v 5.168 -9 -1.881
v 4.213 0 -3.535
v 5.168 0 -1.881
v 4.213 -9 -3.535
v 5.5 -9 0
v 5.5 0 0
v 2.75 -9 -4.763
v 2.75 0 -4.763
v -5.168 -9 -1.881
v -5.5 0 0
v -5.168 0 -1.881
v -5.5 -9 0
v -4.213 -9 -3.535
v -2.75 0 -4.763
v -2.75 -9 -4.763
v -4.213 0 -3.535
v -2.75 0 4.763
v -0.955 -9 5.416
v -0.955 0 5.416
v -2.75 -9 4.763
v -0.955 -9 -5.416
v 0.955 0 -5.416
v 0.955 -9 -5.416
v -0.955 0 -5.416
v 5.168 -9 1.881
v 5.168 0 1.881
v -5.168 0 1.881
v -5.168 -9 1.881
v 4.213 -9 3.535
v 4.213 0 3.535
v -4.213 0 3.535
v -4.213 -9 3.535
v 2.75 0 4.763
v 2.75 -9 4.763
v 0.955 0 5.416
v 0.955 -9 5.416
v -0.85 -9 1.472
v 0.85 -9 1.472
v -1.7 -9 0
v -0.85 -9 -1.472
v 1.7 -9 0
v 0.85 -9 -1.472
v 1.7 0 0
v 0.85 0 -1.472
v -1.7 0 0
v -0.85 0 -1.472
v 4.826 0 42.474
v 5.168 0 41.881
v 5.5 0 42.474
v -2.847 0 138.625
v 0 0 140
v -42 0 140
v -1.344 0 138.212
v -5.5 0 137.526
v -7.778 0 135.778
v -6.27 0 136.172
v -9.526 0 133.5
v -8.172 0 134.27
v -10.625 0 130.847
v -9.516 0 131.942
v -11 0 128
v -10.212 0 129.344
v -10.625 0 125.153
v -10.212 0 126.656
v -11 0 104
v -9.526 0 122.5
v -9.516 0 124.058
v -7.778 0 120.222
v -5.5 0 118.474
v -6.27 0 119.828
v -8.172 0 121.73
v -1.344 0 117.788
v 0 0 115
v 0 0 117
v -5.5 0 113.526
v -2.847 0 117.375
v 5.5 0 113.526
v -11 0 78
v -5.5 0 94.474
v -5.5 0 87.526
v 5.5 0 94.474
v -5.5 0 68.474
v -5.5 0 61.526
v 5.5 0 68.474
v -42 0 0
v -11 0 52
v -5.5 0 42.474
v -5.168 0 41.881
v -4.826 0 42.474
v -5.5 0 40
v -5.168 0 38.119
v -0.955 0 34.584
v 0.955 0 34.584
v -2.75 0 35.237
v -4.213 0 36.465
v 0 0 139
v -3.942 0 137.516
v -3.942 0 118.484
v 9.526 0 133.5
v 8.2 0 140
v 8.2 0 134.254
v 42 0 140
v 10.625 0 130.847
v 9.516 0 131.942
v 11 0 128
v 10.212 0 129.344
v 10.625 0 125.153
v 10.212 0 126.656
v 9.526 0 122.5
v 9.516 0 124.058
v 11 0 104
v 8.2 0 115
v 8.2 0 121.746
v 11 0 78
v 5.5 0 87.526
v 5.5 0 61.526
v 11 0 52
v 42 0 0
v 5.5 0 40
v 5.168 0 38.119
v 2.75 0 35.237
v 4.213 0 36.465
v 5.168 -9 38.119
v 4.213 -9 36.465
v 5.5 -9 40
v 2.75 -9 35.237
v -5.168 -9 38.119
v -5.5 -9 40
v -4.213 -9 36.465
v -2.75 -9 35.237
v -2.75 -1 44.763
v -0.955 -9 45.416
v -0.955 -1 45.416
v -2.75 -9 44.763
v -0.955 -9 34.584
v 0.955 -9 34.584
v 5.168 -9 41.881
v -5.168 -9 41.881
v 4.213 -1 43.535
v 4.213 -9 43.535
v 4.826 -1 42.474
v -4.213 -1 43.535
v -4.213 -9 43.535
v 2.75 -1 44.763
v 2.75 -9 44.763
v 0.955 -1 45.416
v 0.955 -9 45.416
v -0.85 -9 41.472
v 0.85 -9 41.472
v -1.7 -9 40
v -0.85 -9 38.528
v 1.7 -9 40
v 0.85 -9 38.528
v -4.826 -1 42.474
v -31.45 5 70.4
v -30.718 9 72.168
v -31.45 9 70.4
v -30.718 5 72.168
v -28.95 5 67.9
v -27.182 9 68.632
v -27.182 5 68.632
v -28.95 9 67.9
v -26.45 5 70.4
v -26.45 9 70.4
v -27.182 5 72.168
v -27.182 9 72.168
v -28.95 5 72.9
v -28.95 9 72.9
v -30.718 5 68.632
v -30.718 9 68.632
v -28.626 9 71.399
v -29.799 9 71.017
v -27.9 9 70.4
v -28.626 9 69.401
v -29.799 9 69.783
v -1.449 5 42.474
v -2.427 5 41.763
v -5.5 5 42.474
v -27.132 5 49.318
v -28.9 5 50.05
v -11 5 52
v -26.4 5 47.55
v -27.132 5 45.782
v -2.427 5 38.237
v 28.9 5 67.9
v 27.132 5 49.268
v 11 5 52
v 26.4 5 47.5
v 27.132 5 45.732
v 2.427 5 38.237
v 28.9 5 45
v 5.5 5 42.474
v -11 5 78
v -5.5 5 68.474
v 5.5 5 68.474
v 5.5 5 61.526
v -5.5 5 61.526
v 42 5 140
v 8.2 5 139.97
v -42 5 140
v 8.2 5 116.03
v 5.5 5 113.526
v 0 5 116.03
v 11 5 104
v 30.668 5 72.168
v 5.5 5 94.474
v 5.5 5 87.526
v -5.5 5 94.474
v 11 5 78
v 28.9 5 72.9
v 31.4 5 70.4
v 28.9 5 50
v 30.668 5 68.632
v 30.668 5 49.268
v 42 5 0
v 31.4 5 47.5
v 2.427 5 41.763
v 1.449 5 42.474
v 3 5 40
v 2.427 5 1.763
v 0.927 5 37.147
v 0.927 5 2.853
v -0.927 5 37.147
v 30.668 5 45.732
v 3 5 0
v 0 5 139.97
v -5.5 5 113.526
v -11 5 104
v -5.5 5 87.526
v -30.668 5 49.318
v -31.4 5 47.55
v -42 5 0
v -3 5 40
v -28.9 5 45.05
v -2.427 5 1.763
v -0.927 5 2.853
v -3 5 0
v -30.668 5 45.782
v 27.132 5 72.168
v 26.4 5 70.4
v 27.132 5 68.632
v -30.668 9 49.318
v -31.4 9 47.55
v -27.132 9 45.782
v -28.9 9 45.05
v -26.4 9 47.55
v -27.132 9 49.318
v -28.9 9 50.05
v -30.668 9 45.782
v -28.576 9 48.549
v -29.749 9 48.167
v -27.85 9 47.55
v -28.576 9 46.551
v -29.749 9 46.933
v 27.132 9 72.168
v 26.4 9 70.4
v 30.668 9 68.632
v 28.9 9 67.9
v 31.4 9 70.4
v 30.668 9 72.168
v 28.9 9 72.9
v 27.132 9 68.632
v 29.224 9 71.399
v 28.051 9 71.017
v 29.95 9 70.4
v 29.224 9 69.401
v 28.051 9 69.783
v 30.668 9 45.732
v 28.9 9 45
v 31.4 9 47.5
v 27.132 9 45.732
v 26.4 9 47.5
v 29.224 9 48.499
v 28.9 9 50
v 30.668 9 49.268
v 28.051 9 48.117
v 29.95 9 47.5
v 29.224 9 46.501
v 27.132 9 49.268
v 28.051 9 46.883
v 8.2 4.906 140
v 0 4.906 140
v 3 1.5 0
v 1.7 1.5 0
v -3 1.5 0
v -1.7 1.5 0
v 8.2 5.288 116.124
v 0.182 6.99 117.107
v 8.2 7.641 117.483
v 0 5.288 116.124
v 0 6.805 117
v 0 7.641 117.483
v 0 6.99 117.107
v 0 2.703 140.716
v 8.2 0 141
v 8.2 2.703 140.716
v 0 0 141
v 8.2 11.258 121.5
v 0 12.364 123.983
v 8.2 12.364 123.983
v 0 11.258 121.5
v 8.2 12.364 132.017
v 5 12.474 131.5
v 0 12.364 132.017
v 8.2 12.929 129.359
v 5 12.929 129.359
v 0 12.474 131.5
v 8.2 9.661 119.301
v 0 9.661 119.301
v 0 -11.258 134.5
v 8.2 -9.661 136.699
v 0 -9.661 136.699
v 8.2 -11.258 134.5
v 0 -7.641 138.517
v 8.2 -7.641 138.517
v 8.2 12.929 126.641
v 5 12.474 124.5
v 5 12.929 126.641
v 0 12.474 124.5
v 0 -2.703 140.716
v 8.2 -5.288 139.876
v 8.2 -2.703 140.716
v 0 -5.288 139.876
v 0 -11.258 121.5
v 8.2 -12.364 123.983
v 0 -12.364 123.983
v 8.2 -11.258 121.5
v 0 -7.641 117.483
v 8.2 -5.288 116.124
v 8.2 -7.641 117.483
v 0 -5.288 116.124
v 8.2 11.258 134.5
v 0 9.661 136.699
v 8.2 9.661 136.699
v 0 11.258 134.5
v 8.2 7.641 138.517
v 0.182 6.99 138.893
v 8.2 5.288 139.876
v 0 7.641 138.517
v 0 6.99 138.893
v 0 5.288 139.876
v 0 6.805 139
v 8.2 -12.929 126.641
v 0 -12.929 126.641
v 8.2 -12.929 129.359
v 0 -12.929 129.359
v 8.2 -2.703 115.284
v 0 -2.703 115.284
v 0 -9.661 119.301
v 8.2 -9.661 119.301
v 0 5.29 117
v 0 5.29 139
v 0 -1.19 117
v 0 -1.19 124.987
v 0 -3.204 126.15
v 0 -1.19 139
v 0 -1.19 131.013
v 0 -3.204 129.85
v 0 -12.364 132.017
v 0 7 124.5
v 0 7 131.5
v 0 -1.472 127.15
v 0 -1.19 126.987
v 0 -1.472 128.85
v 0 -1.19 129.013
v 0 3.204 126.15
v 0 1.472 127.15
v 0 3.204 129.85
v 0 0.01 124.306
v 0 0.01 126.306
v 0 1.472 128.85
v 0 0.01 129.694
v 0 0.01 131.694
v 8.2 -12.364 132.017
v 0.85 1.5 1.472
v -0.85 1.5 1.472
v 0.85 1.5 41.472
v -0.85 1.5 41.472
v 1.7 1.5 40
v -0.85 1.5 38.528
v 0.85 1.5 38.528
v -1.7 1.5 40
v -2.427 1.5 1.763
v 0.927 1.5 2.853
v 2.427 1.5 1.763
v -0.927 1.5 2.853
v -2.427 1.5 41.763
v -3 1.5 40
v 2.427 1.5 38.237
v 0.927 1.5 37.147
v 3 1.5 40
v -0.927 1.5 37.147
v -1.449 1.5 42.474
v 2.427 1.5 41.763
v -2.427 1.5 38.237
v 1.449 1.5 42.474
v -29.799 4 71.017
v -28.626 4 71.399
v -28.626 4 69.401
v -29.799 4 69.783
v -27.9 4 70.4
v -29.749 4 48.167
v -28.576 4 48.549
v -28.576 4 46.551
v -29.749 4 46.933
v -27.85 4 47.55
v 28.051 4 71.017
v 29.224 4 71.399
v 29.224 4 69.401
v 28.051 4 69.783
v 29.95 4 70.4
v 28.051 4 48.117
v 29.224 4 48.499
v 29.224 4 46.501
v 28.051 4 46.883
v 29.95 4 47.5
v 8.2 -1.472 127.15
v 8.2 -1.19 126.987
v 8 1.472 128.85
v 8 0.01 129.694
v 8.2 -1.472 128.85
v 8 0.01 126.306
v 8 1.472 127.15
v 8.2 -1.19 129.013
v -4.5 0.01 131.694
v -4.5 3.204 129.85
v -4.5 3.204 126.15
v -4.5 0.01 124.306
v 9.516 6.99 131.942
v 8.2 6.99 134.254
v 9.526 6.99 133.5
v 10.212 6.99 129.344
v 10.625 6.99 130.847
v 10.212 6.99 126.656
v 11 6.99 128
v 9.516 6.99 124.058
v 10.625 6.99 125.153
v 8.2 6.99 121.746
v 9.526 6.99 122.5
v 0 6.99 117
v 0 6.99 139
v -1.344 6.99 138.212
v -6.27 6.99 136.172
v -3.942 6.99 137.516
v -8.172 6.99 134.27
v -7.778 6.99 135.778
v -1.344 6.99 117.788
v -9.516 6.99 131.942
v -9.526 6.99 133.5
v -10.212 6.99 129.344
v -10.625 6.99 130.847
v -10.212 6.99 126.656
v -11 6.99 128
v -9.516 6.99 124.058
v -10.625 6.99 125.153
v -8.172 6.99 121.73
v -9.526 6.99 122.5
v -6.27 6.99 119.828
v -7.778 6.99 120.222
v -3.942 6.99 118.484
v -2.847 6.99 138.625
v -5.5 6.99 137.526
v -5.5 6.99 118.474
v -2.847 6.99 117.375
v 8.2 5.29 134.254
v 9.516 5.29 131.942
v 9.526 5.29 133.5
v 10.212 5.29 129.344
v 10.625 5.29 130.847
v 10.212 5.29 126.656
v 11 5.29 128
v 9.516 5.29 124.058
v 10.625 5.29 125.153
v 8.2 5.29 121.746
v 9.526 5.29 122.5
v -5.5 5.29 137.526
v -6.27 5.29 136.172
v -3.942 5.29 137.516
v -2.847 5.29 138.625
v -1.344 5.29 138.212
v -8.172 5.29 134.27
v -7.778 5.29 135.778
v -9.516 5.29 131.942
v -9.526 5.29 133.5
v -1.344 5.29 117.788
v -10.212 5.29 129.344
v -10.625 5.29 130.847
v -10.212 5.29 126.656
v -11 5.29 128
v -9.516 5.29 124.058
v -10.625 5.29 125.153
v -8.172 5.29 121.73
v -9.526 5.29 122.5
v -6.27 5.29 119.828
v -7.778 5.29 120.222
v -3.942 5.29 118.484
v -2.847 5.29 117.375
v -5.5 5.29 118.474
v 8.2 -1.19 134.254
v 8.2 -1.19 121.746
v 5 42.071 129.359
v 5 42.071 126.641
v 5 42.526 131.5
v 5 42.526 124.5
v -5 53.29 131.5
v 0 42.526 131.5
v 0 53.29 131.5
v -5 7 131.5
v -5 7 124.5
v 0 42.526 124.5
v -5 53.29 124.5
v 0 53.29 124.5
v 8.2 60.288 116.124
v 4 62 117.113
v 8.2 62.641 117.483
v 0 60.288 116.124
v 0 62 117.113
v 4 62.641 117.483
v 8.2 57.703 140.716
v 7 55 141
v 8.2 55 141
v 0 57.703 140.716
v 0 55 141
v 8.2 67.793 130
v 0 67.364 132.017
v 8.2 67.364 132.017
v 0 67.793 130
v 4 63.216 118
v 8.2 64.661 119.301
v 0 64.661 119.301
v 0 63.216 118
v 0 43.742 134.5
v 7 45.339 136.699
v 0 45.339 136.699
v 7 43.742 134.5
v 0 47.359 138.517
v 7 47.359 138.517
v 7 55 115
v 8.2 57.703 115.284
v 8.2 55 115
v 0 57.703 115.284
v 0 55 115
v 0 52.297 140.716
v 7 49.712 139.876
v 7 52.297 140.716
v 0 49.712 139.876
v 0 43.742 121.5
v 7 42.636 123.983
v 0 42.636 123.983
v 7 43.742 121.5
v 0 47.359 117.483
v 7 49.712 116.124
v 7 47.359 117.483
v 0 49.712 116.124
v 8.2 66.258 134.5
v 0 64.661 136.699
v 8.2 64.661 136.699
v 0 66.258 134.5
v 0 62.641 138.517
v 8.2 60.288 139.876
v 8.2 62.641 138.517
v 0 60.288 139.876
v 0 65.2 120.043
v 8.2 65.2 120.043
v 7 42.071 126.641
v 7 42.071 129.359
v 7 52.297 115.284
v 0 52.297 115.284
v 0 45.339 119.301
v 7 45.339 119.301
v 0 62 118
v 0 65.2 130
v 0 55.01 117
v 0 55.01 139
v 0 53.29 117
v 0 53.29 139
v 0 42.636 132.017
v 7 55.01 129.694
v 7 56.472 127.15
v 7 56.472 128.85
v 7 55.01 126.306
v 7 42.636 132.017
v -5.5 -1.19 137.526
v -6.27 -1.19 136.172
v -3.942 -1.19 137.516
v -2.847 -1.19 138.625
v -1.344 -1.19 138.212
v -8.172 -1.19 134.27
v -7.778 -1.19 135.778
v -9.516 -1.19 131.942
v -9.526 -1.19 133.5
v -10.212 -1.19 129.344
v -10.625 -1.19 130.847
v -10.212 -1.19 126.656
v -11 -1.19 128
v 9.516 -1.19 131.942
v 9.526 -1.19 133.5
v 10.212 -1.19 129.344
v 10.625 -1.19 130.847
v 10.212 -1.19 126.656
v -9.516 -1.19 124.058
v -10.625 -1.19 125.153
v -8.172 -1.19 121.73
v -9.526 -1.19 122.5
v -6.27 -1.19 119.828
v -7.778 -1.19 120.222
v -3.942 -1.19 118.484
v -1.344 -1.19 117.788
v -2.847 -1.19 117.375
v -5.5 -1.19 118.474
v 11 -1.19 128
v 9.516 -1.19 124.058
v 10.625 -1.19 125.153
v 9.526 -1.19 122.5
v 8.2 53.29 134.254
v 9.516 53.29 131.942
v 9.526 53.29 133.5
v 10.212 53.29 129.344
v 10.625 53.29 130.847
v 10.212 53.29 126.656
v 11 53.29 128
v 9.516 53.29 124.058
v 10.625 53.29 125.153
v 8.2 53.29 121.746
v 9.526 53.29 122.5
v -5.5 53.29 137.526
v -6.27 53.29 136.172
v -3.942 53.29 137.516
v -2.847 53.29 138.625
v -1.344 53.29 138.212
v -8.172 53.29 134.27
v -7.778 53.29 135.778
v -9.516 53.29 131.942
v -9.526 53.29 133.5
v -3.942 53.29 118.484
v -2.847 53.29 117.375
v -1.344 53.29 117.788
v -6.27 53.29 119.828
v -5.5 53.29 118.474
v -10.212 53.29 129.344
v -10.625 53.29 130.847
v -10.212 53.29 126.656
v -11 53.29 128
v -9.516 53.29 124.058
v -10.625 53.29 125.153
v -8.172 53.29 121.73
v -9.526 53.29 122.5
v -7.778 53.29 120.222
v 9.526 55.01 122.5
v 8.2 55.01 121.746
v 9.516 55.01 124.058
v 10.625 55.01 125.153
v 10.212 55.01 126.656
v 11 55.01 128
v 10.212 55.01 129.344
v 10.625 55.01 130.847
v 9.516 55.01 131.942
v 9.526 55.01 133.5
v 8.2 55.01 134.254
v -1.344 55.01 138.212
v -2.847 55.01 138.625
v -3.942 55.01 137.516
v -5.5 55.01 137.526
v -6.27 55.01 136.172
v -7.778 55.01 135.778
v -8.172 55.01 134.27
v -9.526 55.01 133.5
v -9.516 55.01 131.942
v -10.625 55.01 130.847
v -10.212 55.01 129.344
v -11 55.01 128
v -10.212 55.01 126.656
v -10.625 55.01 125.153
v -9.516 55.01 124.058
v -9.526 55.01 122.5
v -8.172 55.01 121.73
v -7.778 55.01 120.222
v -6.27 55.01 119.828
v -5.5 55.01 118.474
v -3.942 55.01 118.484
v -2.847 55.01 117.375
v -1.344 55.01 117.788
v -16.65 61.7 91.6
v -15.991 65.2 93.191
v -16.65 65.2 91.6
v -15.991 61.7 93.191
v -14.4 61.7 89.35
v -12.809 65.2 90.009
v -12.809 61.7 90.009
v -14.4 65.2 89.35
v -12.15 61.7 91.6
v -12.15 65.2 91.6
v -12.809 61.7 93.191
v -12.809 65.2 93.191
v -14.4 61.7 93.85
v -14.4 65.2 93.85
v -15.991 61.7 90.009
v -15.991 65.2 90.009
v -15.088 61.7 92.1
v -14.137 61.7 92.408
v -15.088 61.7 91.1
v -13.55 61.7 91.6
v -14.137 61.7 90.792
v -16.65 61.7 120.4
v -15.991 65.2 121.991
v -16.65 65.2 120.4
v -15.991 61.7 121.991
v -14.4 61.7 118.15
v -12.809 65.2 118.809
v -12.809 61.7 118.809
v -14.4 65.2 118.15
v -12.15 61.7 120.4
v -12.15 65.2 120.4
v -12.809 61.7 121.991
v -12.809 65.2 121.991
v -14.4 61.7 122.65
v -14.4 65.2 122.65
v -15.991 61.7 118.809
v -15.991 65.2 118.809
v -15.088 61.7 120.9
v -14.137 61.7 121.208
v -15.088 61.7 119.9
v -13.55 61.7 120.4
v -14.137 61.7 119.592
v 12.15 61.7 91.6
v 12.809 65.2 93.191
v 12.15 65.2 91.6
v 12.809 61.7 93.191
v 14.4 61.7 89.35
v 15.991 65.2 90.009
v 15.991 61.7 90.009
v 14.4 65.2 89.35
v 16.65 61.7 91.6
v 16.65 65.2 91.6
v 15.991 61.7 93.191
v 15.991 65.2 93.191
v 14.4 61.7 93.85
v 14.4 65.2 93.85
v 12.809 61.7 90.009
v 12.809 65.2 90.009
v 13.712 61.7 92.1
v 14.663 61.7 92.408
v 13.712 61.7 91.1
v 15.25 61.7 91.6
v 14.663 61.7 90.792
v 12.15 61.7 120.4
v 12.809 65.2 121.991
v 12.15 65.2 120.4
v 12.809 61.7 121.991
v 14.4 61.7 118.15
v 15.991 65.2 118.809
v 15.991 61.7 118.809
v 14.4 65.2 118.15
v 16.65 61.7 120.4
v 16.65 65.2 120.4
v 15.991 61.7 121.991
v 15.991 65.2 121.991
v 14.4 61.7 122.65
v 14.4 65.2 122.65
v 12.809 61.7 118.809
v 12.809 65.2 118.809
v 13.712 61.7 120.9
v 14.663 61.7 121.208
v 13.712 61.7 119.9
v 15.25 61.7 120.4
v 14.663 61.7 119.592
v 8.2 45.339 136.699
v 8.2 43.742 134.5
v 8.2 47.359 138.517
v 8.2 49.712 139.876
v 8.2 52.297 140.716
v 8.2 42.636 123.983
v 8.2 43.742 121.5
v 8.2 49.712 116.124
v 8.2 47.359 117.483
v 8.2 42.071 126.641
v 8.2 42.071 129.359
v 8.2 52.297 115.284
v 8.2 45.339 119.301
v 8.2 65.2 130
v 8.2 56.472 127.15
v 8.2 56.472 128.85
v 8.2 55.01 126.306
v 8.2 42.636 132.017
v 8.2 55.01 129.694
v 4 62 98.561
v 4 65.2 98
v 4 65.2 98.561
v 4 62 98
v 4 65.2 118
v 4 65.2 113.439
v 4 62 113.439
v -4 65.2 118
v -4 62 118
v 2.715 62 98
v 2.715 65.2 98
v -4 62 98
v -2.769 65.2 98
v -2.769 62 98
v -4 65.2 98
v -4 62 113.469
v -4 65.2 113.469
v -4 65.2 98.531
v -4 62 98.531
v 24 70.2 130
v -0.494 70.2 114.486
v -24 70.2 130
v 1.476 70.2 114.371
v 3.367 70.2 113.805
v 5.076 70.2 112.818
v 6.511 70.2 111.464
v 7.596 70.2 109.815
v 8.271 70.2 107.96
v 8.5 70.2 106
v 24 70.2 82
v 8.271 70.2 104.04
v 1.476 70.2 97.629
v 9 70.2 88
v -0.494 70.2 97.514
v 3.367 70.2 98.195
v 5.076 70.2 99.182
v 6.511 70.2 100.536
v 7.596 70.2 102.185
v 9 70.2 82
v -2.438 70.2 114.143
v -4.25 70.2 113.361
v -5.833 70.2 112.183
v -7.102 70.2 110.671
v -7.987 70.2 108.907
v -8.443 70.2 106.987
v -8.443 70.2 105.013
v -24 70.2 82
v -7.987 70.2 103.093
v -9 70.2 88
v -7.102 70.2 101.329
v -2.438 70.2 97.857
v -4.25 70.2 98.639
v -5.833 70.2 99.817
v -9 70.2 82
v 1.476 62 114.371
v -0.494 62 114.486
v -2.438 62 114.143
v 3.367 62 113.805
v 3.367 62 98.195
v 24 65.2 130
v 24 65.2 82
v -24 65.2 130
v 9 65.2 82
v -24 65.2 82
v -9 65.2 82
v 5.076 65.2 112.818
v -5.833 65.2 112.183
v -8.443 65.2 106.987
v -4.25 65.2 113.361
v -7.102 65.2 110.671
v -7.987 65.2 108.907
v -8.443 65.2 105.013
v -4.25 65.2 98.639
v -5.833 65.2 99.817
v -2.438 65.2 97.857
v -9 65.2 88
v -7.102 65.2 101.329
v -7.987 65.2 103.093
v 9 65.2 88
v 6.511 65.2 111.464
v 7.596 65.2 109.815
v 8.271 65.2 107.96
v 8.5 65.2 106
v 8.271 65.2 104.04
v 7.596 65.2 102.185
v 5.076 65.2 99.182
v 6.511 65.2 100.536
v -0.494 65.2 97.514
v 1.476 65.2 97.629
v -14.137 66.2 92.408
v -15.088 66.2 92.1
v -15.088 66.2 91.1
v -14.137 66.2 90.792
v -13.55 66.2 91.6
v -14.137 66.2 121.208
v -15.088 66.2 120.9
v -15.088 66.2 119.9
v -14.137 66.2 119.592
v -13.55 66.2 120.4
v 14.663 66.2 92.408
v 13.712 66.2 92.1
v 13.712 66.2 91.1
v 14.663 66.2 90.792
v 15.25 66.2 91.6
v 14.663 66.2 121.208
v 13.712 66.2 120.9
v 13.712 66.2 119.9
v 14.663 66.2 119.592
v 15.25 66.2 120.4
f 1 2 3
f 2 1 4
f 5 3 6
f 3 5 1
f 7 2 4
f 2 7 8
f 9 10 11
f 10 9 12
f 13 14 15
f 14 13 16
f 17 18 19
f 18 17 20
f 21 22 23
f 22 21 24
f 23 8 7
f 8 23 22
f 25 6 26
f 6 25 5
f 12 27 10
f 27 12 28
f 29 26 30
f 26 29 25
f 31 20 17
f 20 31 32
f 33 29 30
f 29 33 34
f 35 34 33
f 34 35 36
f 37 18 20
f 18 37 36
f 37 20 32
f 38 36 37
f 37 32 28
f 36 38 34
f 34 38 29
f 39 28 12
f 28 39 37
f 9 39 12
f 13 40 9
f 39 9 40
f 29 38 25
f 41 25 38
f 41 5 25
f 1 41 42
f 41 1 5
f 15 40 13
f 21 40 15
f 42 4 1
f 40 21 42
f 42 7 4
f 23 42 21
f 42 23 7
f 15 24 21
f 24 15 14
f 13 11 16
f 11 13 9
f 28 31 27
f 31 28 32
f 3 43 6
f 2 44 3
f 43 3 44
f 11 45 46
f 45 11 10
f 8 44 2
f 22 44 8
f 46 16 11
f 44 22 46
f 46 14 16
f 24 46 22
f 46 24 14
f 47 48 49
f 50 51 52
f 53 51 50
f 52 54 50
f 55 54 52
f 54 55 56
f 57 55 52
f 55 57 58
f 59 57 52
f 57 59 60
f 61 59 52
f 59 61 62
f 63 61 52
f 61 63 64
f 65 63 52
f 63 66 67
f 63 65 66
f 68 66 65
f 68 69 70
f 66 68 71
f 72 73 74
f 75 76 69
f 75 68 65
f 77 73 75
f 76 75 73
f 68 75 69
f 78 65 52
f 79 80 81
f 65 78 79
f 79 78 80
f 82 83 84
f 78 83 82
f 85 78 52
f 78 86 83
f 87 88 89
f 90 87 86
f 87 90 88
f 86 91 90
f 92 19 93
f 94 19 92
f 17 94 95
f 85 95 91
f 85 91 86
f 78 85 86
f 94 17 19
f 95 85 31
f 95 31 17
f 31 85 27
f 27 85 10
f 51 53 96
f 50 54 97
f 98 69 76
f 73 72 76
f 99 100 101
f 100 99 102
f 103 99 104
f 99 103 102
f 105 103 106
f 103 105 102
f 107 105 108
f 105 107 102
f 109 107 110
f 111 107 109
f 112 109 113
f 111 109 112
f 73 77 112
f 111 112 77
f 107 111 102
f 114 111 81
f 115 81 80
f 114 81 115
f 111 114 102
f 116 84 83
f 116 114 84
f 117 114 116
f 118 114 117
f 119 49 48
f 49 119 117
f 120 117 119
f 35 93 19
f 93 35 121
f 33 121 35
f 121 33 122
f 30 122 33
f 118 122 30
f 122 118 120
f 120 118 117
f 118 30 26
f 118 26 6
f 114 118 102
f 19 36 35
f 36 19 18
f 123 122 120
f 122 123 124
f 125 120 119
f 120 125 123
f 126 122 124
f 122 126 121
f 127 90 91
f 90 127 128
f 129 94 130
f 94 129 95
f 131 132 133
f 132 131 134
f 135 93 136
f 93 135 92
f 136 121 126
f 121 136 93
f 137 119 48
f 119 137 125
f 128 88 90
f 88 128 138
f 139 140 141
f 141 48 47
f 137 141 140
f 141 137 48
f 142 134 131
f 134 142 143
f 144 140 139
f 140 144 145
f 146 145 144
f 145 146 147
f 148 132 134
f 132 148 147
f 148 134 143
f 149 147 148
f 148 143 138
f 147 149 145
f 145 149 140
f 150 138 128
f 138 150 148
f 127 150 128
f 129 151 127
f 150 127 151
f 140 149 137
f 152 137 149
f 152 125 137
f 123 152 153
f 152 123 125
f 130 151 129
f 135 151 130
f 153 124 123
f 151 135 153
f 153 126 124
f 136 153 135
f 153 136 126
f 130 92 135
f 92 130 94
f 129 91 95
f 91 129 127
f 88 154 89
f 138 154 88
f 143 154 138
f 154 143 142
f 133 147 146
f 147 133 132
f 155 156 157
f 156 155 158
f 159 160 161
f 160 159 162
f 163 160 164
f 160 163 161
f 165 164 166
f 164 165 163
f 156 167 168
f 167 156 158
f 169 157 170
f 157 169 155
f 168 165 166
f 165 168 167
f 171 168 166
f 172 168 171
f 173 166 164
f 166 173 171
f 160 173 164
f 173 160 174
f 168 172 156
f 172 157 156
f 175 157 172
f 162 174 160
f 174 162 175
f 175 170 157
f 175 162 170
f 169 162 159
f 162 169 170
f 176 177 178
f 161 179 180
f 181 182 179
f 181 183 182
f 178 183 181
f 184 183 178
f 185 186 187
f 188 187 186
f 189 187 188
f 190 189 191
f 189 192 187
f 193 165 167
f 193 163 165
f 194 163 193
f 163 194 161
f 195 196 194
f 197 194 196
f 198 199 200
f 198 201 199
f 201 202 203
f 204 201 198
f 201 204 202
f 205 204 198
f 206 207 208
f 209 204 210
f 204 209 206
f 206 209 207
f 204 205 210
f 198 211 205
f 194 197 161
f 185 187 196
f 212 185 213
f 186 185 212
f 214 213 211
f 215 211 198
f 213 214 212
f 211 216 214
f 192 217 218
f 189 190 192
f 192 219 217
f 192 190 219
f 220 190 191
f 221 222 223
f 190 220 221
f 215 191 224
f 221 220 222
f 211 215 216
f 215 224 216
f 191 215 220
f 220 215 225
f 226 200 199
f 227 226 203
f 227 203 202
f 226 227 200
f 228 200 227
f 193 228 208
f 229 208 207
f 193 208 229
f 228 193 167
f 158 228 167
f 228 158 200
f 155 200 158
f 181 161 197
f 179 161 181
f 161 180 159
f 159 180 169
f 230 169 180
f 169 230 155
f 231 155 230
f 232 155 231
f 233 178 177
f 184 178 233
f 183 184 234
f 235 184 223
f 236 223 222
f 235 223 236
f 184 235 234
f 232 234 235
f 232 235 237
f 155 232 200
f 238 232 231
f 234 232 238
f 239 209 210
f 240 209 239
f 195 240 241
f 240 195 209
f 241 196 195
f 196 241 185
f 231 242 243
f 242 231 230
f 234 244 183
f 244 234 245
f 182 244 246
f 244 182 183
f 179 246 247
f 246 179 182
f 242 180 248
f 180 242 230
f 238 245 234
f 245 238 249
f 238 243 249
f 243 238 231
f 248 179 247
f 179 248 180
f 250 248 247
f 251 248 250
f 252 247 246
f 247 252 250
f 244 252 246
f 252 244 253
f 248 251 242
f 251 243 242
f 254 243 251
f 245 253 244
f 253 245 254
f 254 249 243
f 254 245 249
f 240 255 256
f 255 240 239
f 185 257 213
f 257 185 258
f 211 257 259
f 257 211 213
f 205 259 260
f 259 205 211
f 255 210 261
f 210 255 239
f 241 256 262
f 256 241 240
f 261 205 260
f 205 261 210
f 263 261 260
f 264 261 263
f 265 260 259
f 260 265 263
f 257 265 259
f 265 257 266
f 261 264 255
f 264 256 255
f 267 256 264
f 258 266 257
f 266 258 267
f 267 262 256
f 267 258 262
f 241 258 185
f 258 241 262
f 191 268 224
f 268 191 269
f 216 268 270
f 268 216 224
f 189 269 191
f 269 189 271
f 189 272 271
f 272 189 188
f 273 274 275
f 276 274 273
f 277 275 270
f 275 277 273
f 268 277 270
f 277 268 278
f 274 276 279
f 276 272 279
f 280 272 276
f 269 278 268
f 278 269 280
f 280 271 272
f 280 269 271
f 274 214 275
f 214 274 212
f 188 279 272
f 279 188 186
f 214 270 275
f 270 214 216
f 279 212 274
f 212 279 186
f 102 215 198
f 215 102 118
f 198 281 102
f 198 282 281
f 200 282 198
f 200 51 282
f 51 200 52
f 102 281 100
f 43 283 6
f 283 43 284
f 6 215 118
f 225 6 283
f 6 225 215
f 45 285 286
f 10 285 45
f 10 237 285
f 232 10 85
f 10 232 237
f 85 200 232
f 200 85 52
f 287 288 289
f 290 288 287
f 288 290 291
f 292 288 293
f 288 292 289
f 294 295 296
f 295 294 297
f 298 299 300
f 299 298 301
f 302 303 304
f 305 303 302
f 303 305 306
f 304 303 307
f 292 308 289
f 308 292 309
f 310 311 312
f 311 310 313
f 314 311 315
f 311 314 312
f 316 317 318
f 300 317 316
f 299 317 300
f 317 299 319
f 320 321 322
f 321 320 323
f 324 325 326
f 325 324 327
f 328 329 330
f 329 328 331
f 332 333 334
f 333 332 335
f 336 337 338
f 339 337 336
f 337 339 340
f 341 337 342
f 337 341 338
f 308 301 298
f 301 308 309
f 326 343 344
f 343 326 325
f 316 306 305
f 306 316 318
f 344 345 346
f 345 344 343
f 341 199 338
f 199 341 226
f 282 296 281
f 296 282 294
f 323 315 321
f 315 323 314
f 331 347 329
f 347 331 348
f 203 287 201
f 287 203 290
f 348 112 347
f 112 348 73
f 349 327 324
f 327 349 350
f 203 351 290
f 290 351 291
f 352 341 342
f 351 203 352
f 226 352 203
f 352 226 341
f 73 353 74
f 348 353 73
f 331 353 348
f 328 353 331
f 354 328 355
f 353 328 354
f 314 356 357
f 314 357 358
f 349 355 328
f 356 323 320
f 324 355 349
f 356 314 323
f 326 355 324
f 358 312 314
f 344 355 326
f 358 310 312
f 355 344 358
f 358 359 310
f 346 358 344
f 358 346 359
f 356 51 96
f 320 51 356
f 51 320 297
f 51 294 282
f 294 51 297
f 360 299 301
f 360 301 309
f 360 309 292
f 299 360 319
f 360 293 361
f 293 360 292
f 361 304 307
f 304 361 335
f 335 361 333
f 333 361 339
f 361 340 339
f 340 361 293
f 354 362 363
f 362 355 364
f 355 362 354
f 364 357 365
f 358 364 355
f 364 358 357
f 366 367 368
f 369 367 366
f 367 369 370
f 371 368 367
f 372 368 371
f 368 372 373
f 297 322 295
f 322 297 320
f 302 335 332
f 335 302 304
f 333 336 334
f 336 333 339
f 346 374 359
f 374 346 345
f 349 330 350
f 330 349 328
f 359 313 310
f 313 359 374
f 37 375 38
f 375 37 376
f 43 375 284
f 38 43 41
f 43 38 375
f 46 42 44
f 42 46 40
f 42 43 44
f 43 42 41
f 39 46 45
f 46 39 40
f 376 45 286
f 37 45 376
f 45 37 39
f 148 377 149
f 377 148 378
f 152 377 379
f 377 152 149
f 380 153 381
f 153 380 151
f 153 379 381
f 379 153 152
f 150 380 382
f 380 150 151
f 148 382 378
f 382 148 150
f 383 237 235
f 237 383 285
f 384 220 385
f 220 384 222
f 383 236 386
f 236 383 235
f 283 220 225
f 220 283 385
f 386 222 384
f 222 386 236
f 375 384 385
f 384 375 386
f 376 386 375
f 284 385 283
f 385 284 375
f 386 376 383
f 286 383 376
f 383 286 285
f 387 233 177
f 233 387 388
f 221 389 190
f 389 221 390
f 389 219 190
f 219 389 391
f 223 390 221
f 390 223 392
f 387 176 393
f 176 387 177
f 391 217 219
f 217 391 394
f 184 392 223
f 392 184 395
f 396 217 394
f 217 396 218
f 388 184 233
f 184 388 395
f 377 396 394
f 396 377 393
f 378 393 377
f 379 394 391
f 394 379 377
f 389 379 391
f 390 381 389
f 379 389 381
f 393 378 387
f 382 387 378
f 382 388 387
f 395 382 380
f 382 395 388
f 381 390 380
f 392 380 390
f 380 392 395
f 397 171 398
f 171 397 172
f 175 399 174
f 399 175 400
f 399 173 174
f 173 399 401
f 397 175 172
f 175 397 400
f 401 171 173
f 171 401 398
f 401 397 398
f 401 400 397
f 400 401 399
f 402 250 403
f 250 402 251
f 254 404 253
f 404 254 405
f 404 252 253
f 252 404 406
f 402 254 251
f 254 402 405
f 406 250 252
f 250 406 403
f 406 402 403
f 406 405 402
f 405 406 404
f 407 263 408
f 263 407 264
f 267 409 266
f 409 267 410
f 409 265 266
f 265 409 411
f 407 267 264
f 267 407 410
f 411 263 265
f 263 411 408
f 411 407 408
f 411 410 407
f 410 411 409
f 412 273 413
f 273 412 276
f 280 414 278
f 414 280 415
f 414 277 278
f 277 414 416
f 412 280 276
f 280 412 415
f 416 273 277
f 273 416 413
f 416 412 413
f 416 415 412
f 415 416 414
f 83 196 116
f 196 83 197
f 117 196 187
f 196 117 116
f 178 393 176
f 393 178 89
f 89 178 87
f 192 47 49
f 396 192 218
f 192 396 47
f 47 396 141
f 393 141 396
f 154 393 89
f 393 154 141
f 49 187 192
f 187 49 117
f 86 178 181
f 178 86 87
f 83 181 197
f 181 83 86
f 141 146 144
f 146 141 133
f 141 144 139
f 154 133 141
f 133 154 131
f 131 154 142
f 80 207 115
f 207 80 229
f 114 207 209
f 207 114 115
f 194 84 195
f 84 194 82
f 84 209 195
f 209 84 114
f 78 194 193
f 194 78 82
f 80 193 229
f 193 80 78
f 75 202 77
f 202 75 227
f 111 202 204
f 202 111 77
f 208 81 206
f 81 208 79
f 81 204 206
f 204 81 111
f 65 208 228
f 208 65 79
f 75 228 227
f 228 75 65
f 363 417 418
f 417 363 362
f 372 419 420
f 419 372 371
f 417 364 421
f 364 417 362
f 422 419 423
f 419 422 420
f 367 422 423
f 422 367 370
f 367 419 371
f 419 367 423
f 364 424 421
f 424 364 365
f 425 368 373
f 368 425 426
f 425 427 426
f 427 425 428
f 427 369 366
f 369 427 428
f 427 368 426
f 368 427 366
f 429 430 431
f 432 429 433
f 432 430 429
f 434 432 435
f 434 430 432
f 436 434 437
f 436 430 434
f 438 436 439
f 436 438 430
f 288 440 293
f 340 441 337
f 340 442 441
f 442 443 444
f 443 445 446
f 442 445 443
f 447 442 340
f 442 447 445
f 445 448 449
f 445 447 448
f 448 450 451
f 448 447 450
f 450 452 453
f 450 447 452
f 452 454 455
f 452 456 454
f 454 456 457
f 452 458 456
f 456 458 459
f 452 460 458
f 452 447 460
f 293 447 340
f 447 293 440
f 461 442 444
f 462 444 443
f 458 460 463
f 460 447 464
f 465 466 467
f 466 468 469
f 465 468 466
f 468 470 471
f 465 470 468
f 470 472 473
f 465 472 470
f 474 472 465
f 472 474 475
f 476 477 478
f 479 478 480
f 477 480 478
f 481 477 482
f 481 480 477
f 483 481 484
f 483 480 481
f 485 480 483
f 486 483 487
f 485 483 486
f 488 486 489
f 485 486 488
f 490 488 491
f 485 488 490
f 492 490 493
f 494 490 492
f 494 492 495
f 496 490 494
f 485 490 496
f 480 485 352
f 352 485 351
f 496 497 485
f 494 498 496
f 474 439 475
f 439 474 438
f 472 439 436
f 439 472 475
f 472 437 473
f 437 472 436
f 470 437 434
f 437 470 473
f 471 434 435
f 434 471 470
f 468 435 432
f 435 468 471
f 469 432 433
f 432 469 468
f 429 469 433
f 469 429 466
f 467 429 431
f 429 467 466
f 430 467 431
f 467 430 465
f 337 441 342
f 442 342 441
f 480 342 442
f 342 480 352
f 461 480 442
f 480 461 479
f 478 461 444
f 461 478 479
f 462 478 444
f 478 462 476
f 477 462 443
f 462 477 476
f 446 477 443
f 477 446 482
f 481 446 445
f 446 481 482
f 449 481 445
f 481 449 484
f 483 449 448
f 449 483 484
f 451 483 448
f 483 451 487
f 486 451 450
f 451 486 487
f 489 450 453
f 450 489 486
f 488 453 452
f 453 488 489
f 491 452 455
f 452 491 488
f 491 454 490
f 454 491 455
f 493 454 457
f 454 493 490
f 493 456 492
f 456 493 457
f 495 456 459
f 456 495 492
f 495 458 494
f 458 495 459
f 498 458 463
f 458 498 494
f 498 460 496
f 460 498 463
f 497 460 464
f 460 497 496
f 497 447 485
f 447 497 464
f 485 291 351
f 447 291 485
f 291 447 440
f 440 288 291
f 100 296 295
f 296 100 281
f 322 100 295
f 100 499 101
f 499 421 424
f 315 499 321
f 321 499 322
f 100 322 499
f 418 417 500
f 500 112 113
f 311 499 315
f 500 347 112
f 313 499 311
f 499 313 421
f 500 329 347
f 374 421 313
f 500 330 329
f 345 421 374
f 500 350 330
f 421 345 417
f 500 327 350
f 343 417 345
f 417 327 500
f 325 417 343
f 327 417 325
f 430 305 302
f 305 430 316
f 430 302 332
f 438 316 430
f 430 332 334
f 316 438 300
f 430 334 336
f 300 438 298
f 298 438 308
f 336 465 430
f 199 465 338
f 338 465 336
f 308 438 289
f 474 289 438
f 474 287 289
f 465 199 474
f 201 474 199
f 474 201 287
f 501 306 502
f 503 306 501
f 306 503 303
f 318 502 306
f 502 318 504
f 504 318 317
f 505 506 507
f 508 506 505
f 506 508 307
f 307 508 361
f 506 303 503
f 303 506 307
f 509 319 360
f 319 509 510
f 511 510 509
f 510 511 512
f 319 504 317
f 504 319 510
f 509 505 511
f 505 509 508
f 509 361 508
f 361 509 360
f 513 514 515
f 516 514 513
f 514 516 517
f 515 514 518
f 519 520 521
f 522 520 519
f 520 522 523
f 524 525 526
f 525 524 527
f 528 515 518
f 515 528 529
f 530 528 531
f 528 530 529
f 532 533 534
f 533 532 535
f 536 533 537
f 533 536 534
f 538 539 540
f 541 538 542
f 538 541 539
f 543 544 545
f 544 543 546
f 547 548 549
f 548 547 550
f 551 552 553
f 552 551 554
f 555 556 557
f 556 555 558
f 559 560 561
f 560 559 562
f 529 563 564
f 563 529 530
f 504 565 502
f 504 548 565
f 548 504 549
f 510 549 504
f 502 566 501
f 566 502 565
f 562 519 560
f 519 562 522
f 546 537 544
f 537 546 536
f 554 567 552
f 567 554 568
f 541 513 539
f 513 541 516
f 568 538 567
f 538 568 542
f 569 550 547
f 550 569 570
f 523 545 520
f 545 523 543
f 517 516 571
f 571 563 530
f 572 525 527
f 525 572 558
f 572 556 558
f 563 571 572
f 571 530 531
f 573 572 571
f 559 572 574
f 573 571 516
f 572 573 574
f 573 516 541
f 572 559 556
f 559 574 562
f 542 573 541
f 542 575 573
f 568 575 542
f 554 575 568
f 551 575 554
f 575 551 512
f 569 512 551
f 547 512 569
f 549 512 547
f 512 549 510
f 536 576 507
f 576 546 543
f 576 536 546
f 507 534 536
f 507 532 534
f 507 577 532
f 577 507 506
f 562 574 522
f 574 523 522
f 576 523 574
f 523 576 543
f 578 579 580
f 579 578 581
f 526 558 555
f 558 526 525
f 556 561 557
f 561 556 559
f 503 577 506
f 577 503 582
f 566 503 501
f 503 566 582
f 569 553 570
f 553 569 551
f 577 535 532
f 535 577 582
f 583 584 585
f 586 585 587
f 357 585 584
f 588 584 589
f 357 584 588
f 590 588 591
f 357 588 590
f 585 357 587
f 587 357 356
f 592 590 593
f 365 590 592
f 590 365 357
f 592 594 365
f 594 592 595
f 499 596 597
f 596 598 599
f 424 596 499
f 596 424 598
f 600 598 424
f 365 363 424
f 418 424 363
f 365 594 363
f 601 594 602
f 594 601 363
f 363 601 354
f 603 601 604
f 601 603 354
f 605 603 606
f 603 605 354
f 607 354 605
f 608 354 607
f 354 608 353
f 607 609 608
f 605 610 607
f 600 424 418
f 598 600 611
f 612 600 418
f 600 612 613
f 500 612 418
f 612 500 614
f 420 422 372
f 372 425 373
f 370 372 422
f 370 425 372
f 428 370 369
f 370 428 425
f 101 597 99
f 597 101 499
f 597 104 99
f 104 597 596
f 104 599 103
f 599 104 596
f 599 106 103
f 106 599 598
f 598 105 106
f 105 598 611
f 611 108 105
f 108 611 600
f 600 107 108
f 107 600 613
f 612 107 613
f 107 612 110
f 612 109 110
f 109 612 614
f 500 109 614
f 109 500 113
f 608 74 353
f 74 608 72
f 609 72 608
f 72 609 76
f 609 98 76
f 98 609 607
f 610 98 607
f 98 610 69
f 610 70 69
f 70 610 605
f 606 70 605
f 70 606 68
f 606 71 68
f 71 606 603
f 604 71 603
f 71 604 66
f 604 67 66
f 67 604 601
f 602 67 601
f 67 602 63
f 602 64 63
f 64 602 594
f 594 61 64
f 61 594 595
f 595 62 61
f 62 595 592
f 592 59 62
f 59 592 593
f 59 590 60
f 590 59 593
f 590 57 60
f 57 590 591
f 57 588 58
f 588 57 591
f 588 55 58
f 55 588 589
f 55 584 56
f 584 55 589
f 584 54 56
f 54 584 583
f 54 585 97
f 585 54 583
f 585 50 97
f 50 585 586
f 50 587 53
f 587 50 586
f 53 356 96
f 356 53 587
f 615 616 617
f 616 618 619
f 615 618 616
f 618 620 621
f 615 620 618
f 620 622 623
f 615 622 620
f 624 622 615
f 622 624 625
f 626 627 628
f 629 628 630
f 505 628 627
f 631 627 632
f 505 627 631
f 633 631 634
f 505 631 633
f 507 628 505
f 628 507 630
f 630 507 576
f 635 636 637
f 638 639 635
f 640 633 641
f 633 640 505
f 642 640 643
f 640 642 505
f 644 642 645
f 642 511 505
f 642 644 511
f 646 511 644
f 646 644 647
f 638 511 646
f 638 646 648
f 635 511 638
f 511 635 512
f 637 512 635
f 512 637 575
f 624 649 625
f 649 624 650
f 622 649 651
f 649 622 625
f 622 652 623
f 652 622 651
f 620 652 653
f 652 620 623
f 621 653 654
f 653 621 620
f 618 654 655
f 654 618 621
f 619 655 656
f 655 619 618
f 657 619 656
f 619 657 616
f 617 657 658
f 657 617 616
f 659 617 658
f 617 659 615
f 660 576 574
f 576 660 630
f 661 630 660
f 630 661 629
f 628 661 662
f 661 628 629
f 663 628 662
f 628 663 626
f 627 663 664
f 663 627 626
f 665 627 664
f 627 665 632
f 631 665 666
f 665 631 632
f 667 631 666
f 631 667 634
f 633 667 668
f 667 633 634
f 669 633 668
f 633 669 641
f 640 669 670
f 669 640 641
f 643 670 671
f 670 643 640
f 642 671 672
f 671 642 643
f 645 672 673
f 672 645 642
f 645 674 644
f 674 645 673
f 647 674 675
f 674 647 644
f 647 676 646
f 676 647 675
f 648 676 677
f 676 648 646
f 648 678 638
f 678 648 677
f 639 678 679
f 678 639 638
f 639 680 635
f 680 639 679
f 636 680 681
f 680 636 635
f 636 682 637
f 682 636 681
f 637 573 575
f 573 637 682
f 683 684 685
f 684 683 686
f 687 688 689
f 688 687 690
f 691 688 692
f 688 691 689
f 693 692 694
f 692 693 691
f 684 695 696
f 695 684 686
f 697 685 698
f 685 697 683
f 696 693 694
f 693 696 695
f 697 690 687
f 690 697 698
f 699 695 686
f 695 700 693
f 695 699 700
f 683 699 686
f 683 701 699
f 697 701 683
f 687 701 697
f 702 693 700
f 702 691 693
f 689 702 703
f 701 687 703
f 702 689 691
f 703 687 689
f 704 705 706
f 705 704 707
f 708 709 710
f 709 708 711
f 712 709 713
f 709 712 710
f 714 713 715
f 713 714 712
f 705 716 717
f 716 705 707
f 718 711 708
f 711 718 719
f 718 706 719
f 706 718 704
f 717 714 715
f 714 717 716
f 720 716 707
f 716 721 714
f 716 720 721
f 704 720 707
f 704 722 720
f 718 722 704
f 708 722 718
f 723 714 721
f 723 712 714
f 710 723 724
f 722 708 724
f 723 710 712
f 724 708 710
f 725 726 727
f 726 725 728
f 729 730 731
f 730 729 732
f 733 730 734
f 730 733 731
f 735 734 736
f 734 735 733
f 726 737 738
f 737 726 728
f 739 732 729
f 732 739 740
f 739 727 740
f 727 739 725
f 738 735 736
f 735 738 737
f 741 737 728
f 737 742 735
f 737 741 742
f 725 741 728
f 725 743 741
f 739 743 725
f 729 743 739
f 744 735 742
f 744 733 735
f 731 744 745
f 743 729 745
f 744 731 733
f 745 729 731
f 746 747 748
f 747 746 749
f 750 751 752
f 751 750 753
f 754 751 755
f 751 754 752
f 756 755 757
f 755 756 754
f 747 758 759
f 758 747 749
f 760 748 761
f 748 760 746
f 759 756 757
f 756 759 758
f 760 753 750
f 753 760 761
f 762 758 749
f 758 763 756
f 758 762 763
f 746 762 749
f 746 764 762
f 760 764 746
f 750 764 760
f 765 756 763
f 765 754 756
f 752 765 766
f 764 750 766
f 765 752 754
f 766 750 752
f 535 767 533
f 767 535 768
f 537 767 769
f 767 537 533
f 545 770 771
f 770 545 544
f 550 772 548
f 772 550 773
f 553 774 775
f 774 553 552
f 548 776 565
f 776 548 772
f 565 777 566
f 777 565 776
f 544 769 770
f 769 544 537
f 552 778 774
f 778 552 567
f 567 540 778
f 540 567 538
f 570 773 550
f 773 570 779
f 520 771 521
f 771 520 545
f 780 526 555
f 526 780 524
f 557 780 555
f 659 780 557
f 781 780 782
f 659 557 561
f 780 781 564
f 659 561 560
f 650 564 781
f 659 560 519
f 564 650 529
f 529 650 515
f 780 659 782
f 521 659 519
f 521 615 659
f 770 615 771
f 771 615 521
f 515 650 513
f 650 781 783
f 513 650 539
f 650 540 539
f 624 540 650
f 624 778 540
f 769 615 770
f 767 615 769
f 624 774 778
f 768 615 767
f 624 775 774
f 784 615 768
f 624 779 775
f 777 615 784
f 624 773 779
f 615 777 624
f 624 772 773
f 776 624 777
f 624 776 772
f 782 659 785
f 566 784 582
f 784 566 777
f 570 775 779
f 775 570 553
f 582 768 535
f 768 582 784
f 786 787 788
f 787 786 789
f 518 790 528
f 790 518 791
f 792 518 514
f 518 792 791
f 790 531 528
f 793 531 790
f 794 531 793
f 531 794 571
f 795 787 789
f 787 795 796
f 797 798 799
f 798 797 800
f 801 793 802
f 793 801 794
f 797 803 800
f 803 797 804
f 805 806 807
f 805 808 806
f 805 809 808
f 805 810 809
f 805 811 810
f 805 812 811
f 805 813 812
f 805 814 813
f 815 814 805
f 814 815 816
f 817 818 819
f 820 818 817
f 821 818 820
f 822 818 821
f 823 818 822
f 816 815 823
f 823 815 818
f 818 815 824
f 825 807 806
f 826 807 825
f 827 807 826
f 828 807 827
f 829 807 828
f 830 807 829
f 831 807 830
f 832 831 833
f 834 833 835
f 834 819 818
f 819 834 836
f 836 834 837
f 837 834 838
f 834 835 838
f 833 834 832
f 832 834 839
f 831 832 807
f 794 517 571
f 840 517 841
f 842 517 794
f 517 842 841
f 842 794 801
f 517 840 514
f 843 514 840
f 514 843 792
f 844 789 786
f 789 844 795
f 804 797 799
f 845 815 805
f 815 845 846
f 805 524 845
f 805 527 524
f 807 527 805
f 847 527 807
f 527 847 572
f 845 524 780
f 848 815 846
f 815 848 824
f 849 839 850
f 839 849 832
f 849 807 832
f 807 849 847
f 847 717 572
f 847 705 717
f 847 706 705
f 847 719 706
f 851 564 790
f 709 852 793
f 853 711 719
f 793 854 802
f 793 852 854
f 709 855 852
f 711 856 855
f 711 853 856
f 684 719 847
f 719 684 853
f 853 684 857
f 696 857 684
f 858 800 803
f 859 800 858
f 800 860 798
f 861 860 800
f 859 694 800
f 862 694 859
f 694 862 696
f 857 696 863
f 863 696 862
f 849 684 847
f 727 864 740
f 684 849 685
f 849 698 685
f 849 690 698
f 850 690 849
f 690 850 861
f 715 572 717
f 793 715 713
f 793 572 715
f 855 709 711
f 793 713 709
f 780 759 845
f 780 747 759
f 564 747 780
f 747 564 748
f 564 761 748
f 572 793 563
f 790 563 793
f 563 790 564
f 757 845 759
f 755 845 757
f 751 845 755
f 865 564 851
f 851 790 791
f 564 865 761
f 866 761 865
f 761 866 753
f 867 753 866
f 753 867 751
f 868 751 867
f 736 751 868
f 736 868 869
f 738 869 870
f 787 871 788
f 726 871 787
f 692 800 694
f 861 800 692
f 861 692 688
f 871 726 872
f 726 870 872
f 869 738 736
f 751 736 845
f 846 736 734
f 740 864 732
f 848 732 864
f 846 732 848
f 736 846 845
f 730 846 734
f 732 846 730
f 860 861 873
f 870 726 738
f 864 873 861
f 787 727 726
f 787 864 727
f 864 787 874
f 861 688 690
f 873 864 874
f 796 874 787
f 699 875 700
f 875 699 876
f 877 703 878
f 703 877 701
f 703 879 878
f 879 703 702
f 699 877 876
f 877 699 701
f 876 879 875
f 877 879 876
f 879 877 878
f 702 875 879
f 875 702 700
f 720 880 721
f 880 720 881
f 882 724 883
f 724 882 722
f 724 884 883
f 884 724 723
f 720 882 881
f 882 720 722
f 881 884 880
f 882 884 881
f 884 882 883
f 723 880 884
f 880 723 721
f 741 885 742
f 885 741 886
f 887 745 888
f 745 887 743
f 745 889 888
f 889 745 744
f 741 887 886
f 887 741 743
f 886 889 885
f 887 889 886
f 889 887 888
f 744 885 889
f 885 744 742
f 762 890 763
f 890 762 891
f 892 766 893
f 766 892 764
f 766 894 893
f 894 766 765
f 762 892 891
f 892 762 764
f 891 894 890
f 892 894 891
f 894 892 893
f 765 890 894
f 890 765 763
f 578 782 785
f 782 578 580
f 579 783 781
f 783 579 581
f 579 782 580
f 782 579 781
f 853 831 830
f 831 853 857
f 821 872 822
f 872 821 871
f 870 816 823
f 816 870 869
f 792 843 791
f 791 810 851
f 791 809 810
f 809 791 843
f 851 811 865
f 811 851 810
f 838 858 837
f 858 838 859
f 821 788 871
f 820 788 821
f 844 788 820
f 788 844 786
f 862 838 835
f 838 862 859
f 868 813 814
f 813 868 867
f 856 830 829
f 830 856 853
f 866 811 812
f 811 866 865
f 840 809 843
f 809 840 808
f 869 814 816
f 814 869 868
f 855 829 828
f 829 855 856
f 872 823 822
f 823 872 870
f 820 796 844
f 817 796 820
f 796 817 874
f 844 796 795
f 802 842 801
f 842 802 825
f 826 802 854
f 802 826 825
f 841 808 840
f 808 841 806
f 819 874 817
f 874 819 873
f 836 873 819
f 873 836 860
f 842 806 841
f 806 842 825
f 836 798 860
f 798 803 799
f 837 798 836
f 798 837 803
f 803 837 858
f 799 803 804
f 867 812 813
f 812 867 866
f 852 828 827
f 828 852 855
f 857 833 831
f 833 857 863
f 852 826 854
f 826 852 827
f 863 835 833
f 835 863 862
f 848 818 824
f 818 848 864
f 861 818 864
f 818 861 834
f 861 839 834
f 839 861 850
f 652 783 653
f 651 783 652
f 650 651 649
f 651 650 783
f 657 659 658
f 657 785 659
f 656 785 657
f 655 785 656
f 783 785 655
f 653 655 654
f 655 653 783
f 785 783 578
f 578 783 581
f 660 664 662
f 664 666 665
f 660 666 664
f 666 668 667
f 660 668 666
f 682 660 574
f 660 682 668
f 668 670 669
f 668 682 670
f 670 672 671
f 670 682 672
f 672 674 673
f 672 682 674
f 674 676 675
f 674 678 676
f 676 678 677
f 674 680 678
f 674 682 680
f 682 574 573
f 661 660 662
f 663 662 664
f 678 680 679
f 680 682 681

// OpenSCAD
// Sentinel V2 — Zero 3W + Arducam 36x36 mount for Ender-3 V3 SE
// FIRST PRINCIPLES REWORK (2026-08-17):
//   - bolts to the two VERTICALLY stacked cap screws (40mm o/c, left end cap)
//   - standoff bosses create a clean vertical mount plane off the irregular cap
//   - Zero 3W mounts flat on the plate, ports UP (USB-C/HDMI/CSI exit top edge)
//   - 2-axis arm: swing (crane) at plate top + camera tilt at arm end,
//     radial-serration clamps (M3 + nut). All serration faces VERTICAL ->
//     prints with NO supports and NO fused scaffolding.
//
// ASSEMBLY (how the three parts connect):
//   BASE hub  (top of plate, axis X, disc faces +/-Y): serrations on +Y face
//   ARM  boss (swing end, axis X): serrations on -Y face, mates base hub +Y
//        bolt #1: M3x20 through arm boss -> base hub, nut in base hub pocket
//        arm extends +Y to the tilt hub (axis X): serrations on +Y face
//   CAM  boss (tilt end, axis X): serrations on -Y face, mates arm hub +Y
//        bolt #2: M3x20 through cam boss -> arm hub, nut in cam boss pocket
//   CAM plate hangs below, faces +Y (toward bed), lens bore + 4 posts (28.8 grid)
//
// Coordinates: +Y = toward bed. Plate lies in X-Z plane at Y=0.
// part = "base" | "arm" | "cam" | "preview"

part = "preview"; // [base, arm, cam, preview]

/* [Cap interface — MEASURED 2026-08-16/17] */
screw_spacing = 40.0;   // cap screws, VERTICAL, one above the other
standoff     = 9.0;     // plate back -> cap face (clears irregular cap)
screw_pilot  = 3.4;     // M3 clearance

/* [Hardware] */
m3_clear  = 3.4;
m3_nut_d  = 7.4;        // M3 nut across-corners + clearance
cam_pilot = 1.7;        // M2 self-tap (camera posts)
z3w_pilot = 2.1;        // M2.5 self-tap (Zero 3W bosses)

/* [Zero 3W — Radxa v1.11 DXF] */
z3w_x = 65.0; z3w_y = 30.0;
z3w_holes = [[3.55,3.60],[3.60,26.45],[61.40,3.60],[61.40,26.50]];

/* [Camera — measured] */
cam_grid = 28.8; lens_d = 17.0;

/* [Structure] */
plate_t = 5.0;          // plate thickness (Y)
plate_w = 84.0;         // plate width (X)
plate_h = 140.0;        // plate height (Z)
boss_h  = 4.0;          // Zero 3W boss height
hub_d   = 26.0;         // serration hub diameter
hub_t   = 7.0;          // hub thickness (along X)
serr_d  = 22.0; serr_n = 24; serr_amp = 0.7; serr_h = 1.2;

z0     = 44.0;          // board bottom edge height (above lower screw)
hub_z  = 128.0;         // hub center height
arm_len = 62.0;         // swing arm length (Y, hub center to hub center)
cam_zc = hub_z - 22;    // camera board center height

// X-axis cylinder: axis along X (used for all hubs/bores)
module xcyl(d, h) { rotate([0,90,0]) cylinder(d=d, h=h); }

module serration_ring(d, n, amp, h) {
    pts = [for (i = [0 : 2*n - 1])
        let(a = 360*i/(2*n), r = (i % 2 == 0) ? d/2 : d/2 - amp)
        [r*cos(a), r*sin(a)]];
    linear_extrude(h) polygon(pts);
}

// ===============================================================
// BASE: standoffs + plate + Zero 3W cradle + swing hub (axis X)
// ===============================================================
module base() {
    difference() {
        union() {
            translate([-plate_w/2, 0, 0]) cube([plate_w, plate_t, plate_h]);
            // standoff bosses on -Y face (toward cap), at z=0 and z=40
            for (sz = [0, screw_spacing])
                translate([0, -standoff, sz]) rotate([-90,0,0])
                    cylinder(d = 11, h = standoff);
            // swing hub at plate top: axis X, centered (0,0,hub_z)
            translate([0, 0, hub_z]) xcyl(d=hub_d, h=hub_t);
            // Zero 3W bosses on +Y face, ports UP
            for (hxy = z3w_holes)
                translate([hxy[0]-z3w_x/2, plate_t, z0 + (z3w_y - hxy[1])])
                    rotate([-90,0,0]) cylinder(d=5, h=boss_h);
        }
        // standoff screw holes (M3 through standoff+plate)
        for (sz = [0, screw_spacing])
            translate([0, -standoff - 1, sz])
                rotate([-90,0,0]) cylinder(d = screw_pilot, h = standoff + plate_t + 2);
        // screw head pockets on +Y face (M3 socket head ~5.5x3)
        for (sz = [0, screw_spacing])
            translate([0, plate_t - 3.5, sz])
                rotate([-90,0,0]) cylinder(d = 6.0, h = 3.6);
        // Zero 3W boss pilots
        for (hxy = z3w_holes)
            translate([hxy[0]-z3w_x/2, plate_t - 1, z0 + (z3w_y - hxy[1])])
                rotate([-90,0,0]) cylinder(d = z3w_pilot, h = boss_h + 2);
        // hub bore along X (M3) + nut pocket on the -X end
        translate([-1, 0, hub_z]) xcyl(d = m3_clear, h = hub_t + 2);
        translate([-4.5, 0, hub_z]) xcyl(d = m3_nut_d, h = 4.5, $fn=6);
        // lightening windows
        for (zz = [52, 78, 104])
            translate([0, -1, zz]) rotate([-90,0,0])
                cylinder(d = 22, h = plate_t + 2, $fn = 6);
    }
    // serration ring on hub +Y face (vertical face -> prints clean)
    translate([0, hub_t - 0.01, hub_z]) rotate([90,0,0])
        serration_ring(serr_d, serr_n, serr_amp, serr_h + 0.5);
}

// ===============================================================
// ARM: swing boss (serrations -Y, mates base +Y) + bar + tilt hub (serr +Y)
// ===============================================================
module arm() {
    difference() {
        union() {
            // swing boss: axis X, centered (0,0,hub_z)
            translate([0, 0, hub_z]) xcyl(d = hub_d, h = hub_t + serr_h);
            // bar from swing boss to tilt hub (along +Y)
            translate([-5, hub_t, hub_z - 3.5]) cube([10, arm_len - hub_t - hub_t, 7]);
            // tilt hub at arm end: axis X
            translate([0, arm_len - hub_t, hub_z]) xcyl(d = hub_d, h = hub_t);
        }
        // swing bore along X + nut pocket on -X end
        translate([-1, 0, hub_z]) xcyl(d = m3_clear, h = hub_t + serr_h + 2);
        translate([-4.5, 0, hub_z]) xcyl(d = m3_nut_d, h = 4.5, $fn=6);
        // tilt bore along X
        translate([arm_len - hub_t - 1, 0, hub_z]) xcyl(d = m3_clear, h = hub_t + 2);
    }
    // swing serrations on -Y face (mates base hub +Y)
    translate([0, -serr_h + 0.01, hub_z]) rotate([-90,0,0])
        serration_ring(serr_d, serr_n, serr_amp, serr_h);
    // tilt serrations on +Y face (mates cam boss -Y)
    translate([0, arm_len - hub_t - 0.01, hub_z]) rotate([90,0,0])
        serration_ring(serr_d, serr_n, serr_amp, serr_h + 0.5);
}

// ===============================================================
// CAM: tilt boss (serrations -Y) + web + camera plate facing +Y
// ===============================================================
module cam() {
    plate_y = hub_t + serr_h + 2;         // camera plate -Y face
    difference() {
        union() {
            // tilt boss: axis X
            translate([0, 0, hub_z]) xcyl(d = hub_d, h = hub_t + serr_h);
            // web down to camera plate
            translate([-4, hub_t, cam_zc - 8]) cube([8, plate_y - hub_t + plate_t, 20]);
            // camera plate (vertical, X-Z plane) facing +Y
            translate([-24, plate_y, cam_zc - 24]) cube([48, plate_t, 48]);
            // camera posts on -Y face
            for (sx = [-cam_grid/2, cam_grid/2], sz = [-cam_grid/2, cam_grid/2])
                translate([sx, plate_y - 3.5, cam_zc + sz])
                    rotate([-90,0,0]) cylinder(d = 4.5, h = 4.5);
        }
        // tilt bore along X + nut pocket on -X end
        translate([-1, 0, hub_z]) xcyl(d = m3_clear, h = hub_t + serr_h + 2);
        translate([-4.5, 0, hub_z]) xcyl(d = m3_nut_d, h = 4.5, $fn=6);
        // lens hole
        translate([0, plate_y - 5, cam_zc]) rotate([-90,0,0])
            cylinder(d = lens_d, h = plate_t + 10);
        // camera post pilots
        for (sx = [-cam_grid/2, cam_grid/2], sz = [-cam_grid/2, cam_grid/2])
            translate([sx, plate_y - 4.5, cam_zc + sz])
                rotate([-90,0,0]) cylinder(d = cam_pilot, h = 5.5);
        // ribbon slot through plate bottom
        translate([-9, plate_y - 1, cam_zc - 26]) cube([18, plate_t + 2, 8]);
    }
    // tilt serrations on -Y face (mates arm tilt hub +Y)
    translate([0, -serr_h + 0.01, hub_z]) rotate([-90,0,0])
        serration_ring(serr_d, serr_n, serr_amp, serr_h);
}

// ===============================================================
if (part == "base")  base();
if (part == "arm")   arm();
if (part == "cam")   cam();
if (part == "preview") {
    color([0.1, 0.1, 0.11]) base();
    color([0.95, 0.95, 0.93]) arm();
    color([0.7, 0.7, 0.7])
        translate([0, arm_len - hub_t, 0]) cam();
}
